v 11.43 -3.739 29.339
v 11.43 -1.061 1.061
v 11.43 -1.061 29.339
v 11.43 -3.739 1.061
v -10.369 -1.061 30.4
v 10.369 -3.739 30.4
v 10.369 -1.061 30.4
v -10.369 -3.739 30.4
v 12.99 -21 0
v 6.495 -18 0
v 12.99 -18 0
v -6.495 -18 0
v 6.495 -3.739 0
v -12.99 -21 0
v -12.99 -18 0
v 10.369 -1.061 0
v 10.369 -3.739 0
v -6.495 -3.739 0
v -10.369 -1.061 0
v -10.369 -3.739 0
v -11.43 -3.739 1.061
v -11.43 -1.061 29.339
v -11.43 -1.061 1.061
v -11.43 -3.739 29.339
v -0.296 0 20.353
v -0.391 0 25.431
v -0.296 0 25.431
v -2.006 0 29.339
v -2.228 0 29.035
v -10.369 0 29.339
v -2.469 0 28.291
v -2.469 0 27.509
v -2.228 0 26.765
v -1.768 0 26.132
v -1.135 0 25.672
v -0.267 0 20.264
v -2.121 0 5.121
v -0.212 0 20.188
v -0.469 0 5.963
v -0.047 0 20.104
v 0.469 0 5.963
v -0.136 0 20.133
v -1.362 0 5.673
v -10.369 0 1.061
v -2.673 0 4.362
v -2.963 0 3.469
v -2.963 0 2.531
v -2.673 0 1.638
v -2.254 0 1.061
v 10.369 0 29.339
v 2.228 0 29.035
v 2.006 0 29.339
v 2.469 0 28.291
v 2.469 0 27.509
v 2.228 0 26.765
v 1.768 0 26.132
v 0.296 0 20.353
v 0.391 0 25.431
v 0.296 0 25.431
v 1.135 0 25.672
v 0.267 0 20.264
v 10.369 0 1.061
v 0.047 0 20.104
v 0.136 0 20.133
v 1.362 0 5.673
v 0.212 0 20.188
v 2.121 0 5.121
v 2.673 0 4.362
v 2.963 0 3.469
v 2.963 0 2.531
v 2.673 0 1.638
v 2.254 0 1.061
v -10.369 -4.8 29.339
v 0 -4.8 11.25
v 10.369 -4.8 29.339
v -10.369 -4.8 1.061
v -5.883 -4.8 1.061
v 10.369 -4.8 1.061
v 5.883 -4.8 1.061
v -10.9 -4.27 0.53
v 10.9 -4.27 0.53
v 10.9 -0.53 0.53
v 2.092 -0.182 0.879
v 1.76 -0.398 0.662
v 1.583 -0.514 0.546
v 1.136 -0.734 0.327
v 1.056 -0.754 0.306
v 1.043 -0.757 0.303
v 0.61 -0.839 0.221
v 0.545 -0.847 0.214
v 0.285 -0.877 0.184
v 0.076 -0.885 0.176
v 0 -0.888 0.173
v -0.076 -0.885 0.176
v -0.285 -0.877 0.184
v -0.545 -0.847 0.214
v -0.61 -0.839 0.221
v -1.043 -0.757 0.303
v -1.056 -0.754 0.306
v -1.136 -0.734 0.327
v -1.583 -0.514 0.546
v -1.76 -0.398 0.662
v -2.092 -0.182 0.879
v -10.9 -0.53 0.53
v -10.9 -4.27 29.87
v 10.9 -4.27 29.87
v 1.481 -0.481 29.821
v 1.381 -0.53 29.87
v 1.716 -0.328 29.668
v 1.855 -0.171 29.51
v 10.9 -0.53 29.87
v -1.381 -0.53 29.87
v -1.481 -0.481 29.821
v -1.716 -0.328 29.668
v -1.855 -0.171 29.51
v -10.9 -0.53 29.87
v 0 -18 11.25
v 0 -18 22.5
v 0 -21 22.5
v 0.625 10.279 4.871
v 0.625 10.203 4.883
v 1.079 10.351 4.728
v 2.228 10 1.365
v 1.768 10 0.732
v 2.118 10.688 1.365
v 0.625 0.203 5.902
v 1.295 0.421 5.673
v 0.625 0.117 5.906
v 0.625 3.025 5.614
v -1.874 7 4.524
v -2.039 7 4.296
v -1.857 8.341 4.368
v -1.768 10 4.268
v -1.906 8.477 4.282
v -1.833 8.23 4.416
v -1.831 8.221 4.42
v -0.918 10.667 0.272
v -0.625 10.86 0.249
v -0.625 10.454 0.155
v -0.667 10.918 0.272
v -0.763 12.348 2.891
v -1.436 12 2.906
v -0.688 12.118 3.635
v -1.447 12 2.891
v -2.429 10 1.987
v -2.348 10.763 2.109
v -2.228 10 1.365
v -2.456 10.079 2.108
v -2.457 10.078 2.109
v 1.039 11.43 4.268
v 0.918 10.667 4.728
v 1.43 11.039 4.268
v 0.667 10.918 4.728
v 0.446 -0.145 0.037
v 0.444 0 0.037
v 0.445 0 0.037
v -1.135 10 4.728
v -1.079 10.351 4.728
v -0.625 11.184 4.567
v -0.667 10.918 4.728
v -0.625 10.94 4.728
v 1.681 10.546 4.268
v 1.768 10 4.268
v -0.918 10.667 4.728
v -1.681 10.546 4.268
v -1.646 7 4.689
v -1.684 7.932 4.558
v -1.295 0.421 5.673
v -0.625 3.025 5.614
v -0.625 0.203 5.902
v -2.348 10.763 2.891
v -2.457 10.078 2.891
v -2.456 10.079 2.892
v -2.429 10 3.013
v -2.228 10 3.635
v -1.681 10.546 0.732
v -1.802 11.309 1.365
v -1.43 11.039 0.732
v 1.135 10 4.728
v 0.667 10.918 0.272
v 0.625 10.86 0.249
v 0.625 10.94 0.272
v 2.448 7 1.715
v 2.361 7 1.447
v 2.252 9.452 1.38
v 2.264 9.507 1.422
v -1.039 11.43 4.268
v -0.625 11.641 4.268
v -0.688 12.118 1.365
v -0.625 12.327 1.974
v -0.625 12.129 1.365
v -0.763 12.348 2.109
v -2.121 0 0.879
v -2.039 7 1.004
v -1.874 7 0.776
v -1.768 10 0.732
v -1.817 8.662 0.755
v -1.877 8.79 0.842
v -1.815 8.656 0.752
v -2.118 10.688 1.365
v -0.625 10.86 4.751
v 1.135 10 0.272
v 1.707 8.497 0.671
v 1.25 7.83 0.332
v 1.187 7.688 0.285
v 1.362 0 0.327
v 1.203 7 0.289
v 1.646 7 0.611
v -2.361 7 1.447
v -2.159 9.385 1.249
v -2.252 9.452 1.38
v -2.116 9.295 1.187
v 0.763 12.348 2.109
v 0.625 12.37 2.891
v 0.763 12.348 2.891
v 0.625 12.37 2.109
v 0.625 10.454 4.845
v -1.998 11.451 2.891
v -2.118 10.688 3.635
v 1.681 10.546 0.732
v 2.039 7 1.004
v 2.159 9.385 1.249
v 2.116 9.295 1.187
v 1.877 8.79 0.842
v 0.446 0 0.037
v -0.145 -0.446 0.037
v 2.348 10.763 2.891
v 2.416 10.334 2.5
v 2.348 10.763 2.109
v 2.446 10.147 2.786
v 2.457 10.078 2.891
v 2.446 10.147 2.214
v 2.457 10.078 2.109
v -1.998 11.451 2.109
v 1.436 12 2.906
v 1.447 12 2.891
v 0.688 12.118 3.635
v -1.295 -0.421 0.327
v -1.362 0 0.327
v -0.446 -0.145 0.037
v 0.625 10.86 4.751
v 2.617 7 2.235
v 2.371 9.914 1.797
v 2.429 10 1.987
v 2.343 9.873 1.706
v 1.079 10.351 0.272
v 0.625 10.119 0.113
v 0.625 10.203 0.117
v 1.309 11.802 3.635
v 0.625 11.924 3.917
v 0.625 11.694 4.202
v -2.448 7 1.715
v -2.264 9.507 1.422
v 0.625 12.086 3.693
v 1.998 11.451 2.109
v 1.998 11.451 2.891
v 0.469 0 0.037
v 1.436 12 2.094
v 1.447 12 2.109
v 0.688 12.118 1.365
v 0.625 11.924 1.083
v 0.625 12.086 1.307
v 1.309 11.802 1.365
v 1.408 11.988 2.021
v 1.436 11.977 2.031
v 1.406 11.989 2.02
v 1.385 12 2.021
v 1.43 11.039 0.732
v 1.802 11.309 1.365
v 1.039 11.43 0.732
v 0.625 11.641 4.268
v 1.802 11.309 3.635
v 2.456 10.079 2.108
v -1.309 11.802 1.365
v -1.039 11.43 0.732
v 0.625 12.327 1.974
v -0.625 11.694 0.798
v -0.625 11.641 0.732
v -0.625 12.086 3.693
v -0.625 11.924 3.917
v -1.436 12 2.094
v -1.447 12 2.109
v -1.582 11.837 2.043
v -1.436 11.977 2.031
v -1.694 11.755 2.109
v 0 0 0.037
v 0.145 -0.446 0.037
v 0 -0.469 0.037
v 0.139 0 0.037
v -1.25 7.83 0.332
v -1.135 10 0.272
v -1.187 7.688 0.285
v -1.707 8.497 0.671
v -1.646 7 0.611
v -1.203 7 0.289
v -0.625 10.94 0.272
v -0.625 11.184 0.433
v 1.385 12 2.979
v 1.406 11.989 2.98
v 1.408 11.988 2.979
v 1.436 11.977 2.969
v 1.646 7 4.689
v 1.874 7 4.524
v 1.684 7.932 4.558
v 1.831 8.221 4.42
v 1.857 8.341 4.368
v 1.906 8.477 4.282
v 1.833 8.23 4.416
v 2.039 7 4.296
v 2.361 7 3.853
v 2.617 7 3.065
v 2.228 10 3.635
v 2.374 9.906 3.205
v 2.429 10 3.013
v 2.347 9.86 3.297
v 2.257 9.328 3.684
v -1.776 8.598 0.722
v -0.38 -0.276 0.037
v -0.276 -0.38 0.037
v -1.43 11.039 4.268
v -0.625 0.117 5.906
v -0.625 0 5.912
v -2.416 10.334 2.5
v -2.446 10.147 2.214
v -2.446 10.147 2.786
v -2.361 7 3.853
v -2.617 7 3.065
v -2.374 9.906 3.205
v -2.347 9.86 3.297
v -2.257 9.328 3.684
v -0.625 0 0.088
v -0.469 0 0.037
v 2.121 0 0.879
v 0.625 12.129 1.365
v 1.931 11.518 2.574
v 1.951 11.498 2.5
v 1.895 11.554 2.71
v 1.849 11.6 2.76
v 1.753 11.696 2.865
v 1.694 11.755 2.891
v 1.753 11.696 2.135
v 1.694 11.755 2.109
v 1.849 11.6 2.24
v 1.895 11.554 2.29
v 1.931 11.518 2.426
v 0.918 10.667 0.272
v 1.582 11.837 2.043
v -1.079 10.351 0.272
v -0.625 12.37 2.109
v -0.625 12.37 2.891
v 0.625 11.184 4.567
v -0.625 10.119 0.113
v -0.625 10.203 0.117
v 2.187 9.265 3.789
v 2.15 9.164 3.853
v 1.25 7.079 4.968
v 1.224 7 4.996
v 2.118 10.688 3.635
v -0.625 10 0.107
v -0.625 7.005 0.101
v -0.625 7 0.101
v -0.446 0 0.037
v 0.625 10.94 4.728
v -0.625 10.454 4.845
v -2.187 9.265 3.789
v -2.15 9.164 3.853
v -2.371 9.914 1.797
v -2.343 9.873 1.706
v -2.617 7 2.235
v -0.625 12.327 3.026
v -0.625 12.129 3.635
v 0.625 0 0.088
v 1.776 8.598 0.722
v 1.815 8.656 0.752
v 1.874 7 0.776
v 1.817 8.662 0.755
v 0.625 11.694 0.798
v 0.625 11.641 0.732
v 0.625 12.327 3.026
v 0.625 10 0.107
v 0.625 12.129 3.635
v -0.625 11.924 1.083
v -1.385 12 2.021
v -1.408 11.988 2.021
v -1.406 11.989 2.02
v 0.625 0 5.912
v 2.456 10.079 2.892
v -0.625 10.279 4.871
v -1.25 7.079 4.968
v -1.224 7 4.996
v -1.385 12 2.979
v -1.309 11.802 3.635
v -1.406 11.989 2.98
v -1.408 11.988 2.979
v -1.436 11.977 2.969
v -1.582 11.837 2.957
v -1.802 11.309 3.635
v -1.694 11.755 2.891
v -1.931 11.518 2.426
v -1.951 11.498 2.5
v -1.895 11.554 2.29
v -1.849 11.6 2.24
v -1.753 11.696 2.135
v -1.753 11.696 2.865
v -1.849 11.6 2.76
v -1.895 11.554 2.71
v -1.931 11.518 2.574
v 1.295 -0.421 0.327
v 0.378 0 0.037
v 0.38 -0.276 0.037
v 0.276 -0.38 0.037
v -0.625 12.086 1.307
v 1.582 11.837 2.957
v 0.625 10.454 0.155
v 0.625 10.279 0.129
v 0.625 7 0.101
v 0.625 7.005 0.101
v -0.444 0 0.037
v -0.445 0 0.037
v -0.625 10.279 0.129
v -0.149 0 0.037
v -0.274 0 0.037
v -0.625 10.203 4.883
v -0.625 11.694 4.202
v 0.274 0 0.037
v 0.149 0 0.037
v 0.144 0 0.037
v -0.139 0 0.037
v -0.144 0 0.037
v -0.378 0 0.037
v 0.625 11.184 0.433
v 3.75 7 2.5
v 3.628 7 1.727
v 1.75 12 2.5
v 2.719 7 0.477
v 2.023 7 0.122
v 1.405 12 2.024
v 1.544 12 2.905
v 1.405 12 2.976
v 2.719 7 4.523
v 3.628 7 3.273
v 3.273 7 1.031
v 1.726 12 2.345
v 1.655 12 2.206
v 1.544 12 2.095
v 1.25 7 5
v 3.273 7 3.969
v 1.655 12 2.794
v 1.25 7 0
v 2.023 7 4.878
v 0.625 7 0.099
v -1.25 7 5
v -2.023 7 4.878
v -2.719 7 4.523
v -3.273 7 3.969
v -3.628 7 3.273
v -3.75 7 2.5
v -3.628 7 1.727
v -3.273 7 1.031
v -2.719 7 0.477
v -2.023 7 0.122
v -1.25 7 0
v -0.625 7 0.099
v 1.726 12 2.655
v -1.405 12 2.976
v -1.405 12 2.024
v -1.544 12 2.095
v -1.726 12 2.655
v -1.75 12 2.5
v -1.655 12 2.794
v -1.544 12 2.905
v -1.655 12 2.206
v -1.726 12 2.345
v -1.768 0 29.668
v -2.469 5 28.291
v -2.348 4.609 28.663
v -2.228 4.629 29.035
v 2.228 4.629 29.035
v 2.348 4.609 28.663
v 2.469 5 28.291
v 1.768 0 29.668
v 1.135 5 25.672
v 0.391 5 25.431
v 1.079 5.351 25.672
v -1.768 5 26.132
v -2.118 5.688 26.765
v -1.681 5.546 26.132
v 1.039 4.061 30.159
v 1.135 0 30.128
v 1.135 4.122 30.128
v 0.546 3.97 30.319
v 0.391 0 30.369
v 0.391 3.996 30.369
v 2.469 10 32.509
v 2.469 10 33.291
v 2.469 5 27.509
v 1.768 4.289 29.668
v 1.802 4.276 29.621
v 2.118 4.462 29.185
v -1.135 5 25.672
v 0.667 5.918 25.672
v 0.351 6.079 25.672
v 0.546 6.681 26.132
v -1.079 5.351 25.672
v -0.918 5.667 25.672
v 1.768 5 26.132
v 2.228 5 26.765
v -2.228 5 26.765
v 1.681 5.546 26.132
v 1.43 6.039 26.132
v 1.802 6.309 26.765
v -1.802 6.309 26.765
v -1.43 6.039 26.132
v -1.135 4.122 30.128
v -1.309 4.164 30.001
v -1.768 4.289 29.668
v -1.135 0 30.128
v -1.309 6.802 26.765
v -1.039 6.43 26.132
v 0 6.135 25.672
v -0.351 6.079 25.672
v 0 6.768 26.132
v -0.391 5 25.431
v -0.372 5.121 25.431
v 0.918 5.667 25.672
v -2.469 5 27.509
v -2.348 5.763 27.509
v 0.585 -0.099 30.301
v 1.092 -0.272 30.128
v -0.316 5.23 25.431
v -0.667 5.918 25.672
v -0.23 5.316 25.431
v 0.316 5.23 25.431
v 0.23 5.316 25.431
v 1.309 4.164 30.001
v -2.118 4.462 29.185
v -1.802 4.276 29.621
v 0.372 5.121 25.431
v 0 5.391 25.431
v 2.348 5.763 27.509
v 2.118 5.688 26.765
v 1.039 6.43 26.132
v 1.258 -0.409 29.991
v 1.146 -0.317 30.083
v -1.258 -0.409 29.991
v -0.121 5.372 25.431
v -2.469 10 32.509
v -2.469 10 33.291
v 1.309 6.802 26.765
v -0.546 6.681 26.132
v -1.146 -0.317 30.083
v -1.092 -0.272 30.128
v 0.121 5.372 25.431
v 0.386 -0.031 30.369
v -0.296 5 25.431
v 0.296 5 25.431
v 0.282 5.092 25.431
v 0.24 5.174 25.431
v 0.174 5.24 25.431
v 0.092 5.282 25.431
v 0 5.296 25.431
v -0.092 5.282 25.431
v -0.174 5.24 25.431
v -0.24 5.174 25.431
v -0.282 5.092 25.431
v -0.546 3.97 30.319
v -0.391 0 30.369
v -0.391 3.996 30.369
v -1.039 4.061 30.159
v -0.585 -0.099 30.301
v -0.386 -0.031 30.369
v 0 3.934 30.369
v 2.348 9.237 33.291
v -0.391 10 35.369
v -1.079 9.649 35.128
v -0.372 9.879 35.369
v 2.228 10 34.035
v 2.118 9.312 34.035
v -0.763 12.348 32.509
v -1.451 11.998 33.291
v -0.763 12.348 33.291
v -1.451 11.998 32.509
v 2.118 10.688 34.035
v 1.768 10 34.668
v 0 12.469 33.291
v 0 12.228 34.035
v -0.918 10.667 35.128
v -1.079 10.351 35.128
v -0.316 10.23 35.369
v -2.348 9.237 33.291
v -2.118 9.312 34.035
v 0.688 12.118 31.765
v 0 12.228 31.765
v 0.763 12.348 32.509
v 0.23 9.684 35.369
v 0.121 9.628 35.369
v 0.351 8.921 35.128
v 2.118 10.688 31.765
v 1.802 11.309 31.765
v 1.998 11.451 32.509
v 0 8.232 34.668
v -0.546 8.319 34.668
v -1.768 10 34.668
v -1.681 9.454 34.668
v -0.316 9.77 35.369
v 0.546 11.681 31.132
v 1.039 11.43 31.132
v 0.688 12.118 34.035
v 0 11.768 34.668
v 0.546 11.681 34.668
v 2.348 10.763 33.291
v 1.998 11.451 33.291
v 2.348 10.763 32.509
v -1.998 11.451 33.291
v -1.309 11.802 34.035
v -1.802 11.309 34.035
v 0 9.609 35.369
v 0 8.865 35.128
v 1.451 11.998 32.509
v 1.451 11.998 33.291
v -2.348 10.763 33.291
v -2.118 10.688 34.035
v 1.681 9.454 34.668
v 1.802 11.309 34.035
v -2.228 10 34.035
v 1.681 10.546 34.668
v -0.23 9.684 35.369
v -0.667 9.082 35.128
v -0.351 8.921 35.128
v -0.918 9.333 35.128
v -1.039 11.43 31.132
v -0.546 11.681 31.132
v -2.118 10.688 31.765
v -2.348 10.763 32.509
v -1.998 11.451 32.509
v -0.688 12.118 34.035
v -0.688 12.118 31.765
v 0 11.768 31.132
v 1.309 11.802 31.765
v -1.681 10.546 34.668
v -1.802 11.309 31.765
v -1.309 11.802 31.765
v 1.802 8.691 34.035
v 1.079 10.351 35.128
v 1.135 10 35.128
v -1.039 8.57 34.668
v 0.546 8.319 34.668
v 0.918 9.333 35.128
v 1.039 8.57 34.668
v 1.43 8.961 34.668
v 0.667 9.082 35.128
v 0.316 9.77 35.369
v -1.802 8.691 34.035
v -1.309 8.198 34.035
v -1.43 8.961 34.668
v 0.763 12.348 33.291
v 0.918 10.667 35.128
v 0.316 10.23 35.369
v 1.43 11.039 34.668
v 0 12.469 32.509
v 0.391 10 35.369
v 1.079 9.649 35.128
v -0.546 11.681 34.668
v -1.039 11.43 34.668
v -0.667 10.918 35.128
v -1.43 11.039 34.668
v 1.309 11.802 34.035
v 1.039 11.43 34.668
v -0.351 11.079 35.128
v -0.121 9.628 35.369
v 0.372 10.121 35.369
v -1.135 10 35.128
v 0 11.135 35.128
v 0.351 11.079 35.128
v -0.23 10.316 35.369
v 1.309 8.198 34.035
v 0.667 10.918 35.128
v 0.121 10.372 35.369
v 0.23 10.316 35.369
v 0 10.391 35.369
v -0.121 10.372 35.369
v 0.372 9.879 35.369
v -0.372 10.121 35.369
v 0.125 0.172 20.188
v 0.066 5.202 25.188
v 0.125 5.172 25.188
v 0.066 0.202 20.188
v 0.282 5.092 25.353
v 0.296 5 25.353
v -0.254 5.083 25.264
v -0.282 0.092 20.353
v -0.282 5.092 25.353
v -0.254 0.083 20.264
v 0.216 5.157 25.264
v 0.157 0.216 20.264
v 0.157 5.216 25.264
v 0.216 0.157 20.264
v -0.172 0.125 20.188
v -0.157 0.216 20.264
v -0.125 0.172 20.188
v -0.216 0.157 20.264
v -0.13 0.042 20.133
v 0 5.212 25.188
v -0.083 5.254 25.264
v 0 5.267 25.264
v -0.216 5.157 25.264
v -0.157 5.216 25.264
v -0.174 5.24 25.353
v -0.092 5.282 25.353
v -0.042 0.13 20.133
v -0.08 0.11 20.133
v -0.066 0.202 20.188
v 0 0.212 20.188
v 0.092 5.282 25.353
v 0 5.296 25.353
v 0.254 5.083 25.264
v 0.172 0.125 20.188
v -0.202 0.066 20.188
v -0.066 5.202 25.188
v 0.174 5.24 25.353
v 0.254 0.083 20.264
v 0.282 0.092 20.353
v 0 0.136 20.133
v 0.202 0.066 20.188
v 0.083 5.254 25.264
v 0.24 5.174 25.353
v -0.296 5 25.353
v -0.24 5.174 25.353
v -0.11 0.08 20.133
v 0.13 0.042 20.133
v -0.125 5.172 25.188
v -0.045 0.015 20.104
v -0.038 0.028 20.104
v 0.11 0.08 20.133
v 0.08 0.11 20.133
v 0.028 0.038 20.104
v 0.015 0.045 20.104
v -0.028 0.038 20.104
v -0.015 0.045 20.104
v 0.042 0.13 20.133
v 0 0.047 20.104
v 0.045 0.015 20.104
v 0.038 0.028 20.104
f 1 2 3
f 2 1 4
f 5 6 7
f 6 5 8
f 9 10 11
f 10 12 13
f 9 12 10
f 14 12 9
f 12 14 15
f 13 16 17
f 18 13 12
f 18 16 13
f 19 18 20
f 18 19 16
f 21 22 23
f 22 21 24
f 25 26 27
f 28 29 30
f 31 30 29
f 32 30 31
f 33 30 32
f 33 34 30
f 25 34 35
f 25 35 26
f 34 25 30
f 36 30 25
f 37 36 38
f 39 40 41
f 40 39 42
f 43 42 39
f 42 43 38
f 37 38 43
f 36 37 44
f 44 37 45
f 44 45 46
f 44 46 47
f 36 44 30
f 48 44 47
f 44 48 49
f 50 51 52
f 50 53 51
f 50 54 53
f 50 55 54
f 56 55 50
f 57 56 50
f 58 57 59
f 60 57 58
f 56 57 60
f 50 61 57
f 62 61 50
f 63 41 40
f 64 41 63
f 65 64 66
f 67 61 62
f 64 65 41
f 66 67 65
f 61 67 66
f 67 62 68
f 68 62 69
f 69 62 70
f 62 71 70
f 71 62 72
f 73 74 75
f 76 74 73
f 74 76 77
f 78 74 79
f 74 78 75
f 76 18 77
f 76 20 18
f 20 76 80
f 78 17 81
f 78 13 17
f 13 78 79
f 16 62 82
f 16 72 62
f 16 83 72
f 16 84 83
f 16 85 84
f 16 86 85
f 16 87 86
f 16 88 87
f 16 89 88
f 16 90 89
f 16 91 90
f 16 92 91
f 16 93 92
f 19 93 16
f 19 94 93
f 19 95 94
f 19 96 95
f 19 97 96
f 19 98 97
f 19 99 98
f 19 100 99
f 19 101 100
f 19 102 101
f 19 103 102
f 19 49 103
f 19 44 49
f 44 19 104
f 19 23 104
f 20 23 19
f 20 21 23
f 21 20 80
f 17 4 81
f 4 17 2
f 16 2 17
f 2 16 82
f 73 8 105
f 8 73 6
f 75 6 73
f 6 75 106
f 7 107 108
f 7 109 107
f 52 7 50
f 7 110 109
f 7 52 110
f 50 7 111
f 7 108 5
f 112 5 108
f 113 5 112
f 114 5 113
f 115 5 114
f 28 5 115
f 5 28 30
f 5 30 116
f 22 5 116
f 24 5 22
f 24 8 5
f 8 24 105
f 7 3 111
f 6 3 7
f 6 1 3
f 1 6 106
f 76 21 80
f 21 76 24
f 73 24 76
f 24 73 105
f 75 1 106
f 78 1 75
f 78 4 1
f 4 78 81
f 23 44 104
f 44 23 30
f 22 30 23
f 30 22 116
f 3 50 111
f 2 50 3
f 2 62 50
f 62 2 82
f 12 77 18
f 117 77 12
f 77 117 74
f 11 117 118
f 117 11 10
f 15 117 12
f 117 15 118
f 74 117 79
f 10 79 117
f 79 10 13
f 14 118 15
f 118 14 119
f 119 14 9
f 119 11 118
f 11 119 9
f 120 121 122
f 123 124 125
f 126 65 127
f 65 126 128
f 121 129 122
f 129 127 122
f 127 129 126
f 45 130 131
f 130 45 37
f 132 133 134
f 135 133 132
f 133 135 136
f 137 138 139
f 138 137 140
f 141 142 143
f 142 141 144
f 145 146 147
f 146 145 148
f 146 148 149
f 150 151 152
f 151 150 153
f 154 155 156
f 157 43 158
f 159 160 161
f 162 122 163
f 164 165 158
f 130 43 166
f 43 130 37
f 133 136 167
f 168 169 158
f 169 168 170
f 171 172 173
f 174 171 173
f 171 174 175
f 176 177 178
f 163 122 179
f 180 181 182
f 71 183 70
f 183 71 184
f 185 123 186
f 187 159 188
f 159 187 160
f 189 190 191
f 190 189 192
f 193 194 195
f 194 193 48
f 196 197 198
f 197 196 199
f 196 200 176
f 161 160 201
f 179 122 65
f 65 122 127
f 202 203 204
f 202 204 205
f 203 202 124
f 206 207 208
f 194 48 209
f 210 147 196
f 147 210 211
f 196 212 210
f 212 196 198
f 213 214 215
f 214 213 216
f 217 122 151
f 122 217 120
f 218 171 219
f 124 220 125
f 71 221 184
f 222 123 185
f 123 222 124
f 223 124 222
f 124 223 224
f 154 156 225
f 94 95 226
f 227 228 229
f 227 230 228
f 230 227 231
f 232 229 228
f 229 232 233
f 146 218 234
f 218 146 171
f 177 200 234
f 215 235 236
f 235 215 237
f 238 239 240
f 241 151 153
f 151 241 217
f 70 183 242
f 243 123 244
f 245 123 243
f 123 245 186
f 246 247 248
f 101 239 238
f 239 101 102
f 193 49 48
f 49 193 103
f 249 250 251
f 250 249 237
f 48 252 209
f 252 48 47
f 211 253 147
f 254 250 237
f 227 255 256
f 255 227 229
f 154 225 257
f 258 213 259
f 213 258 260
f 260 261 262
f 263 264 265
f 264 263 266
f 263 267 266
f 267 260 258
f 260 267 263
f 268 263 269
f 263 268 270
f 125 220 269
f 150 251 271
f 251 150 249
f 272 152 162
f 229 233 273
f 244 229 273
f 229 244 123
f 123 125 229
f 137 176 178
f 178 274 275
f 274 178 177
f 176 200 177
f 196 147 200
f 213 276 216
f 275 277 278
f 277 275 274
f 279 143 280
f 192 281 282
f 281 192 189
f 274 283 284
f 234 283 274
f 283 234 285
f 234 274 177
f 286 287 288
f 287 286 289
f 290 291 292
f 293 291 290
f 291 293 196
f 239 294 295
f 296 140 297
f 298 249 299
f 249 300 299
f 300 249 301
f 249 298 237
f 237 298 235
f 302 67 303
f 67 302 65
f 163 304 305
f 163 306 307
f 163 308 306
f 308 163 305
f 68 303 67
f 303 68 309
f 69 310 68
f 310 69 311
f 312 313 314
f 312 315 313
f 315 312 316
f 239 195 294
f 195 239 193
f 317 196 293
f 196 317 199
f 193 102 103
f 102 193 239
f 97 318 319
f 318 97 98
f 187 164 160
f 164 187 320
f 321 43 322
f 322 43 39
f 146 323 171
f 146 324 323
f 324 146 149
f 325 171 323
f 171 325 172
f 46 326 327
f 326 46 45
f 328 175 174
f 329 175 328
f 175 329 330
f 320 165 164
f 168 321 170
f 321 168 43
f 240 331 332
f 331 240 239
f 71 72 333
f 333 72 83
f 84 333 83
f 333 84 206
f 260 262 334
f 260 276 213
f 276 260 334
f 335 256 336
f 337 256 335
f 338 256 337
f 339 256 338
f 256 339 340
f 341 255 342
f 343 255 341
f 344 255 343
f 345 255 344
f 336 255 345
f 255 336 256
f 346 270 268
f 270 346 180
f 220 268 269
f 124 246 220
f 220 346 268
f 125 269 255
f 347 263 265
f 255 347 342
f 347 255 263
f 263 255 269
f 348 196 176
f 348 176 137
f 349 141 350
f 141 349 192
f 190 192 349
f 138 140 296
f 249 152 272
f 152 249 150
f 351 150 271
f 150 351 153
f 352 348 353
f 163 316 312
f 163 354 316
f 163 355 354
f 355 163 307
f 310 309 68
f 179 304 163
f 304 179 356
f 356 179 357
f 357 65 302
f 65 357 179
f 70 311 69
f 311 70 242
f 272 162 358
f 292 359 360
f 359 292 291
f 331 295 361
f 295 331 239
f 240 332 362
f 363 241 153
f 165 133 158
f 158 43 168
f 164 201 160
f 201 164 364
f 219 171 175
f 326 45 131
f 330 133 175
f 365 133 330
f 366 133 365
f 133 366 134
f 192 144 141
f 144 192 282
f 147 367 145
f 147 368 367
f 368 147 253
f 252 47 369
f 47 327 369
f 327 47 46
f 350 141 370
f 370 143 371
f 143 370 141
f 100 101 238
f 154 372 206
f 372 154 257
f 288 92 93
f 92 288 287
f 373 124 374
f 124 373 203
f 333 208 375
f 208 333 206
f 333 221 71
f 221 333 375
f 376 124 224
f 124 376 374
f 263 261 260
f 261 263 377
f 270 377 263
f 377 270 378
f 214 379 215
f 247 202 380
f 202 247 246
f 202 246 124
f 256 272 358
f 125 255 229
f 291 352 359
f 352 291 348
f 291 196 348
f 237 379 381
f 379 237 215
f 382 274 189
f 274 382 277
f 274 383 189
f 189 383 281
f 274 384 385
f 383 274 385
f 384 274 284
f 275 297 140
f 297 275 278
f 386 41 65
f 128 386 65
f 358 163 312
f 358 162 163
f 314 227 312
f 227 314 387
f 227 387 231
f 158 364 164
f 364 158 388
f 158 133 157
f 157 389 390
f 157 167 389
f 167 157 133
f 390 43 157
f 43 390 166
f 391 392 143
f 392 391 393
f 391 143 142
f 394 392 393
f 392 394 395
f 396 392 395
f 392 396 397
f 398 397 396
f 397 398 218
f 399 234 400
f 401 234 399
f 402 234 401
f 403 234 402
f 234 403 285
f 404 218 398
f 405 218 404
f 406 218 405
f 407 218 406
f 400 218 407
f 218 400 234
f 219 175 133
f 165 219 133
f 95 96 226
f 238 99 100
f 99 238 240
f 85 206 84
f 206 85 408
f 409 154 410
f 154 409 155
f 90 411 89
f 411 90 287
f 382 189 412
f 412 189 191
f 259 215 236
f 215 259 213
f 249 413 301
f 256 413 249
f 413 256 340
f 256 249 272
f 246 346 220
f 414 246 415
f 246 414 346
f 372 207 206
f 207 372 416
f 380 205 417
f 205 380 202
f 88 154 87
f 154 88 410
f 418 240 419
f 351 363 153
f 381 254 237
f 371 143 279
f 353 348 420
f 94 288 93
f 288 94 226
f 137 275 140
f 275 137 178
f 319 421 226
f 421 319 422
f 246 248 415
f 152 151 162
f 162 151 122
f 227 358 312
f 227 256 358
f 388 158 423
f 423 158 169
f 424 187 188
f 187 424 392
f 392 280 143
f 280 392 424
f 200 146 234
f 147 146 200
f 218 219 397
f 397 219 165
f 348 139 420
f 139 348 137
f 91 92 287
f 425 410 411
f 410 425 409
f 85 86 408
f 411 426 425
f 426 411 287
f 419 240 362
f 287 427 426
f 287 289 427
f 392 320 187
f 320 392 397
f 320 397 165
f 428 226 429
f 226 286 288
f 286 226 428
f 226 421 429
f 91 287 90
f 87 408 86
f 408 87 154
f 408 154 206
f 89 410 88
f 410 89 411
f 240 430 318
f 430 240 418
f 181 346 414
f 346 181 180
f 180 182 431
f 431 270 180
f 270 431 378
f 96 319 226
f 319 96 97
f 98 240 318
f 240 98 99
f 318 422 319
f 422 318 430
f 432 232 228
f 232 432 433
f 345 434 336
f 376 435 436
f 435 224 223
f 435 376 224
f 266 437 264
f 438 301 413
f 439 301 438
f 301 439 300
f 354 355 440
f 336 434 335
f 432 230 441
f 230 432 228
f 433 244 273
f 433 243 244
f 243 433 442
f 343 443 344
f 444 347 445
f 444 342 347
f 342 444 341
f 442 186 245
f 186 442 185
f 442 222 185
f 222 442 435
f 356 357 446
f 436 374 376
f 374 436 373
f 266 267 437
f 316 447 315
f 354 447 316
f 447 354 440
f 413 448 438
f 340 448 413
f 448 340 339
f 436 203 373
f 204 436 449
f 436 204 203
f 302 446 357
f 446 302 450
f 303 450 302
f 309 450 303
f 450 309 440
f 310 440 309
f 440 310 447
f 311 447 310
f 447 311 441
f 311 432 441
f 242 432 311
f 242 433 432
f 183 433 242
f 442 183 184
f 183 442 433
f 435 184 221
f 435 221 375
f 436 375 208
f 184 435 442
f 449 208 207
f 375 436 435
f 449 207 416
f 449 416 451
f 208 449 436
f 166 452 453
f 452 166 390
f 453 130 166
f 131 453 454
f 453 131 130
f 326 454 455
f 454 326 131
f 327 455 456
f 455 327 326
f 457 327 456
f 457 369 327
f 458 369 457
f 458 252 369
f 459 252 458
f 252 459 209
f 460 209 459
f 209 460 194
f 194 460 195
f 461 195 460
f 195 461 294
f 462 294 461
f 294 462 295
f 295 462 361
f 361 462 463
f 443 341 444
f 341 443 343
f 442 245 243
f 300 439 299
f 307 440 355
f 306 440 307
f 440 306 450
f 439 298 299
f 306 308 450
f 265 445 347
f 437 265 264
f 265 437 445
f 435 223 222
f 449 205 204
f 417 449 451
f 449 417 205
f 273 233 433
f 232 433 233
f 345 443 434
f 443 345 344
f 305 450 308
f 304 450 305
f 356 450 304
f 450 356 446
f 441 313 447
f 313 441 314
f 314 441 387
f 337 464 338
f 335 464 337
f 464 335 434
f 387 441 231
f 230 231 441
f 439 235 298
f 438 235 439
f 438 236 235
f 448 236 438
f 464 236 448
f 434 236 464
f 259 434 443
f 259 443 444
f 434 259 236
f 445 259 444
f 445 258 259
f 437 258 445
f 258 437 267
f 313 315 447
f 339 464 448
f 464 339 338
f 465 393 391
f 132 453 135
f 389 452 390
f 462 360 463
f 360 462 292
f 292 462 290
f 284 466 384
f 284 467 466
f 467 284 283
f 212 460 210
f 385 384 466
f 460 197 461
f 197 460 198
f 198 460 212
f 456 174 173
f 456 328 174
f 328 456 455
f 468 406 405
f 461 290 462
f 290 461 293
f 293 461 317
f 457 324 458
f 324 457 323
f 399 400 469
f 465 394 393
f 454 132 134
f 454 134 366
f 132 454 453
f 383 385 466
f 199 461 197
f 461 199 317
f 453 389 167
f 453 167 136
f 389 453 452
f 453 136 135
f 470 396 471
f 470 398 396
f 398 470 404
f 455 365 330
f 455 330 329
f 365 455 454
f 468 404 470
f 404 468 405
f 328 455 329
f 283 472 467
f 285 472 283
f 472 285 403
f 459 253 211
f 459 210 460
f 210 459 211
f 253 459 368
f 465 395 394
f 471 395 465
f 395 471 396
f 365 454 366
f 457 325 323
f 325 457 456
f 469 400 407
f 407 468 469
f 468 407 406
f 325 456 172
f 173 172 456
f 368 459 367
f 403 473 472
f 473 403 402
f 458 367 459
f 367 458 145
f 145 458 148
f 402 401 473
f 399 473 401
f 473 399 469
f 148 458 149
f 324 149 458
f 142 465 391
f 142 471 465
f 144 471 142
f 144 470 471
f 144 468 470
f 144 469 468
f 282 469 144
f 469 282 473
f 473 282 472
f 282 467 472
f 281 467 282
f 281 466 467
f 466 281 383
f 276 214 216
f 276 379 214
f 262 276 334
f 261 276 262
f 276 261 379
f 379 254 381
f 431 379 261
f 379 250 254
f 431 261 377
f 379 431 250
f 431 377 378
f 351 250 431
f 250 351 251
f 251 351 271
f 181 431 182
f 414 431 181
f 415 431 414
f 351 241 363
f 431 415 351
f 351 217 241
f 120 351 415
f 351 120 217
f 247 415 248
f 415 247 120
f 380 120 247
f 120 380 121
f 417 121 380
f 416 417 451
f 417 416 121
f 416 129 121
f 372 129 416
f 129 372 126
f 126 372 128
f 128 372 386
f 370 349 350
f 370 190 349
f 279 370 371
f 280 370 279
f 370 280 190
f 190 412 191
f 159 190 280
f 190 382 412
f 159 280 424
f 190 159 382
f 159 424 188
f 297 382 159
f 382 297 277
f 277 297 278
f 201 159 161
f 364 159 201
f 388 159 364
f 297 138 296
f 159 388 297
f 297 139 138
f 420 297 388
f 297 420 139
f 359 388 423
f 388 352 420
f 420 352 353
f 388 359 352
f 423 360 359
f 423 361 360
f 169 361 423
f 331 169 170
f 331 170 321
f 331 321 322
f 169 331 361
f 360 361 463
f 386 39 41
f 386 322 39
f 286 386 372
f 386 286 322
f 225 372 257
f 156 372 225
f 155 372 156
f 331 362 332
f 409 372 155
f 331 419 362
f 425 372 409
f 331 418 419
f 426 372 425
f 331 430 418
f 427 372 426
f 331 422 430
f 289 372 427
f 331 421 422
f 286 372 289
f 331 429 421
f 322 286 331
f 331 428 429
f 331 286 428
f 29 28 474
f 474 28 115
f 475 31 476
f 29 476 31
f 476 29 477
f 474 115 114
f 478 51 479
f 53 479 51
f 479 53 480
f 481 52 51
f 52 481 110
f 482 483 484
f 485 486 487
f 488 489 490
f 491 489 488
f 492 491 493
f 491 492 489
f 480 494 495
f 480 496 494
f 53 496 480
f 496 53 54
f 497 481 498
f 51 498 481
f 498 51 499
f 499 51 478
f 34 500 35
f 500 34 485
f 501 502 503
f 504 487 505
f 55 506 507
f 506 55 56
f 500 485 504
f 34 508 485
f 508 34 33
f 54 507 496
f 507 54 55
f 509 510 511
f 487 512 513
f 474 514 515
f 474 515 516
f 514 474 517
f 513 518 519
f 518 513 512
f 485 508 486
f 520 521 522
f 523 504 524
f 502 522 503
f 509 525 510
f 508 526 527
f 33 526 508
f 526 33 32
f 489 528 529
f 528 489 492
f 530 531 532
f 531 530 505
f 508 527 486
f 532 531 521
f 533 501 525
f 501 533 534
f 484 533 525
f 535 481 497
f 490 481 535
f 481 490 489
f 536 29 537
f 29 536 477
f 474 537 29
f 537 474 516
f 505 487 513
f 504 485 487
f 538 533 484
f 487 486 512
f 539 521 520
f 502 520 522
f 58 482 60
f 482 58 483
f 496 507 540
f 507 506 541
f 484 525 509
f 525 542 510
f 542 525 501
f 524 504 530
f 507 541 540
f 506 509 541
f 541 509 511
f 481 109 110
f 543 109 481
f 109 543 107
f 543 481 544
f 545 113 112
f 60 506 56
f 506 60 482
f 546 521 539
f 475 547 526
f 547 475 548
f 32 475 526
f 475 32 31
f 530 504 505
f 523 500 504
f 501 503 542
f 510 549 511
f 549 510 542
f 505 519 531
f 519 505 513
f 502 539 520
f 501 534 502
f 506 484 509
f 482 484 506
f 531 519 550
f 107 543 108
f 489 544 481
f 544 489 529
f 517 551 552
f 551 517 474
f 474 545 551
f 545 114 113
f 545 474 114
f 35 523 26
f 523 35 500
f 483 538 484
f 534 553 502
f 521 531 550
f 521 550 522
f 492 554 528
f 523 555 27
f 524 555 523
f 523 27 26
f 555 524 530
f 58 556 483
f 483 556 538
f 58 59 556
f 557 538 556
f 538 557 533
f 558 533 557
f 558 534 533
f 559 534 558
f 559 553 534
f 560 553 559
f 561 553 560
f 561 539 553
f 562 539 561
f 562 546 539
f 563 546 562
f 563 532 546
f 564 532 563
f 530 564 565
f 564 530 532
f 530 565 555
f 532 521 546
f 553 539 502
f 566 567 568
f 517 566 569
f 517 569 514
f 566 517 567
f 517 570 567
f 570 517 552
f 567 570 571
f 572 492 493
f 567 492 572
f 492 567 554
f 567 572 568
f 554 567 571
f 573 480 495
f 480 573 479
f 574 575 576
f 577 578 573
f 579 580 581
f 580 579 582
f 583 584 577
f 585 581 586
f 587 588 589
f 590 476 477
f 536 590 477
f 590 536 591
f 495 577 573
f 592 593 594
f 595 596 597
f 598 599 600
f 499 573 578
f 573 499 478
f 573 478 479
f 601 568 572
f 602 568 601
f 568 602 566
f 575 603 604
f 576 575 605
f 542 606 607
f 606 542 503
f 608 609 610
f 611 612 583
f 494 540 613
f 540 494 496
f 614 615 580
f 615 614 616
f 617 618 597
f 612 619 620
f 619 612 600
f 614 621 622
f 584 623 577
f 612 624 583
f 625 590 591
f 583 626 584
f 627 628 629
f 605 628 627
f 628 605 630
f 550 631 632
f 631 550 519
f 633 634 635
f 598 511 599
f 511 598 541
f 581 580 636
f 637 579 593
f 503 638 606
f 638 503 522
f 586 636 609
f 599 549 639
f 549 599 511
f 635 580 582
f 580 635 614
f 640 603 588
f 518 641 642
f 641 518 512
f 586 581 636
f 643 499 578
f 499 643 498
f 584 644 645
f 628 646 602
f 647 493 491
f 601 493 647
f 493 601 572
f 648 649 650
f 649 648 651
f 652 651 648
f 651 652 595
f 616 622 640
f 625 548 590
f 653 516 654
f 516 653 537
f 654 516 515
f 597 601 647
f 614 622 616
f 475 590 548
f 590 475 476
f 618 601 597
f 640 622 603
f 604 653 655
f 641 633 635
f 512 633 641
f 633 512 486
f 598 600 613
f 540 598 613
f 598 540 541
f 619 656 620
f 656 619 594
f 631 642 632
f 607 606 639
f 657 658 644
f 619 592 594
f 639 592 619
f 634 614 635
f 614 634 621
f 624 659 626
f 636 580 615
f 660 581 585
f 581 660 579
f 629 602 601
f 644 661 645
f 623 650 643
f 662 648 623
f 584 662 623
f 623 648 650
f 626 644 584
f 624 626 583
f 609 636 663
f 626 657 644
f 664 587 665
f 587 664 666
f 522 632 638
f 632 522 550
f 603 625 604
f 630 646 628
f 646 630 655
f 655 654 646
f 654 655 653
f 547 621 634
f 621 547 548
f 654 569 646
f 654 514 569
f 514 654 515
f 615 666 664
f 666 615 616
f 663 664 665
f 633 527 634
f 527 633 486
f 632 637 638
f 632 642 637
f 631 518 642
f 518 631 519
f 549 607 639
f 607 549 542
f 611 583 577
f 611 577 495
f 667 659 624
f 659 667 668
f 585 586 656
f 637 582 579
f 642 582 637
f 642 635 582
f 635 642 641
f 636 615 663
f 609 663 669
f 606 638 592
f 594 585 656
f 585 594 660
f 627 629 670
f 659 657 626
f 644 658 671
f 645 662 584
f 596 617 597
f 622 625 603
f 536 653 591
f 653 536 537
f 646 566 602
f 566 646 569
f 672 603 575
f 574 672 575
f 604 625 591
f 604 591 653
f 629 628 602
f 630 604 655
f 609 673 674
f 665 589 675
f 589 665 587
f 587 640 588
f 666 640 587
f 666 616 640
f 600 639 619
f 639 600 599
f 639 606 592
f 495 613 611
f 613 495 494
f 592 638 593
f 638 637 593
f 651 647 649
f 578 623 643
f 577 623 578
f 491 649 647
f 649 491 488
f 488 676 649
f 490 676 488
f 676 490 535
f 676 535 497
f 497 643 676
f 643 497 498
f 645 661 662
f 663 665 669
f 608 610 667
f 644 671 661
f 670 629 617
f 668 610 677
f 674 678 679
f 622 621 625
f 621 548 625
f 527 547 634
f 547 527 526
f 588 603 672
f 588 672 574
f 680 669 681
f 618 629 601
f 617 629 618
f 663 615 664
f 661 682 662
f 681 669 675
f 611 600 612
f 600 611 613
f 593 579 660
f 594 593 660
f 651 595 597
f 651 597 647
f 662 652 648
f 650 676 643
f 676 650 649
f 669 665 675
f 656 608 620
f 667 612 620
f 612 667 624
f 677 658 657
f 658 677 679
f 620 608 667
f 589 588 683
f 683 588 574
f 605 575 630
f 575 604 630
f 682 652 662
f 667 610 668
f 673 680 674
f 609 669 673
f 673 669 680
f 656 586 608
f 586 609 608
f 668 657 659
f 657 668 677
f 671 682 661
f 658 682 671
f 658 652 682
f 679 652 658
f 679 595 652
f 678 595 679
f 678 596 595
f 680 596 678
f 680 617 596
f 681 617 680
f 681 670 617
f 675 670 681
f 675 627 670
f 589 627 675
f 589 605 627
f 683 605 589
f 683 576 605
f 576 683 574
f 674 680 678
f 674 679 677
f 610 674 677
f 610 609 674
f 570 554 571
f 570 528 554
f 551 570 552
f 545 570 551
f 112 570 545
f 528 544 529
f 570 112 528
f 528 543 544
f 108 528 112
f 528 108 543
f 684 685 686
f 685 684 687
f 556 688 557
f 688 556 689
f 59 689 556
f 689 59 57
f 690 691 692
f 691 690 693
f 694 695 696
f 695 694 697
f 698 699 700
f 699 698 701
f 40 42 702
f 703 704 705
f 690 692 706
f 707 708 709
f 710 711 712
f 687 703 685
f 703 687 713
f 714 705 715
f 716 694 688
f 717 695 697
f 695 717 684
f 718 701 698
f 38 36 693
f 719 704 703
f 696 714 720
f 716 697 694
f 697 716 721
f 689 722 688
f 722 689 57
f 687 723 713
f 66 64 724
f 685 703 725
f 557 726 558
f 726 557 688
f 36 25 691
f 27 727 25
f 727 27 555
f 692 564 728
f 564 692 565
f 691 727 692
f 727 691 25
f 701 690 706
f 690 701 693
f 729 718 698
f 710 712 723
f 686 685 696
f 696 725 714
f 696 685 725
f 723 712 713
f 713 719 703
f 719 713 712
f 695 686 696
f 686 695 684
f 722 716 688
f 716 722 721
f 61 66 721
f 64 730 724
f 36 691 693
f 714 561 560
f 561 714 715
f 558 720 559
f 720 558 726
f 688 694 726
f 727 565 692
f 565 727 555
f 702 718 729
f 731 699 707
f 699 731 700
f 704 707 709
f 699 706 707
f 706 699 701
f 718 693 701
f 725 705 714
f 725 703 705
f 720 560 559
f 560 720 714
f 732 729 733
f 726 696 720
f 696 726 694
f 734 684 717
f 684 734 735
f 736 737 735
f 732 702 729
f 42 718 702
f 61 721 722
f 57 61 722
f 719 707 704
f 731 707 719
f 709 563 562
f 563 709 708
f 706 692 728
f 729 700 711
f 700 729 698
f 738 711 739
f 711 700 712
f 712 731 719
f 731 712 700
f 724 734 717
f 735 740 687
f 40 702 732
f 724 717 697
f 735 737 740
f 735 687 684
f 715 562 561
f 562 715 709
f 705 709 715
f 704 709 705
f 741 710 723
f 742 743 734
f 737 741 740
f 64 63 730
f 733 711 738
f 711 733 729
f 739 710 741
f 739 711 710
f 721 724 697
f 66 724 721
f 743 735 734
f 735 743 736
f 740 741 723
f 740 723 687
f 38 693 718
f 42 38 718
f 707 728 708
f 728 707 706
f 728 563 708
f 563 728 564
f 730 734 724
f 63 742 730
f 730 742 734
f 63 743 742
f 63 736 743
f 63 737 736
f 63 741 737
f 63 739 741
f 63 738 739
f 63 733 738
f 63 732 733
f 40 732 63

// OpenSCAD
// file: ../primitives/chamfers.scad
module chamfered_cube(x,y,z,edge){
    difference(){
        cube([x,y,z]);
        
        
        // Buttom Cuts
        translate([0,0,(-sqrt(2)*(edge))/2])
            rotate([45,0,0])
                cube([x,edge,edge]);
        
        translate([0,y,(-sqrt(2)*(edge))/2])
            rotate([45,0,0])
                cube([x,edge,edge]);
        
        translate([0,0,(-sqrt(2)*(edge))/2])
            rotate([0,-45,0])
                cube([edge,y,edge]);
        
        translate([x,0,(-sqrt(2)*(edge))/2])
            rotate([0,-45,0])
                cube([edge,y,edge]);
        
        // Top Cuts
        translate([0,0,z-(sqrt(2)*(edge))/2])
            rotate([45,0,0])
                cube([x,edge,edge]);
        
        translate([0,y,z-(sqrt(2)*(edge))/2])
            rotate([45,0,0])
                cube([x,edge,edge]);
        
        translate([0,0,z-(sqrt(2)*(edge))/2])
            rotate([0,-45,0])
                cube([edge,y,edge]);
        
        translate([x,0,z-(sqrt(2)*(edge))/2])
            rotate([0,-45,0])
                cube([edge,y,edge]);
                
        // Side Cuts
        translate([0,-(sqrt(2)*(edge))/2,0])
            rotate([0,0,45])
                cube([edge,edge,z]);
                
        translate([x,-(sqrt(2)*(edge))/2,0])
            rotate([0,0,45])
                cube([edge,edge,z]);
                

        translate([0,y-(sqrt(2)*(edge))/2,0])
            rotate([0,0,45])
                cube([edge,edge,z]);
                
        translate([x,y-(sqrt(2)*(edge))/2,0])
            rotate([0,0,45])
                cube([edge,edge,z]);

        
    }
  
}


module chamfered_box(x,y,z,edge,wall_thickness){
    difference(){
        chamfered_cube(x,y,z,edge);
        
        translate([wall_thickness, wall_thickness,wall_thickness])
            chamfered_cube(x-wall_thickness*2,
                       y-wall_thickness*2,
                       z-wall_thickness*2,
                       edge/sqrt(2));
            
    }
}

module chamfered_square_ring(x,y,thickness,edge){
    chamfered_cube(x,thickness,thickness,edge);
    chamfered_cube(thickness,y,thickness,edge);
    translate([0,y-thickness,0])
        chamfered_cube(x,thickness,thickness,edge);
    translate([x-thickness,0,0])
        chamfered_cube(thickness,y,thickness,edge);

}

module chamfered_main(){
    chamfered_square_ring(10,20,3,1);
    
}

//chamfered_main();
// file: pegboard.scad
hole_pitch = 25.4;
hole_diameter = 5;
board_thickness = 5;
wall_thickness = 0.6*3;

$fn=20;

include <../primitives/chamfers.scad>;

module peg_lower_support(){
    // Thickness of the slot
    slot = hole_diameter/4;
    // 
    snap_offset = board_thickness+2;
    // Shift everything Down 1 peg hole

        difference(){
            union(){
                hull(){
                    translate([0,0,0.5])
                        sphere(d=hole_diameter+1);
                    translate([0,board_thickness*2,0])
                        sphere(d=hole_diameter);
                
                }
                translate([slot,snap_offset,0])
                    rotate([-90,0,0])
                        cylinder( h=hole_diameter,
                            d1=hole_diameter,d2=1);
                translate([-slot,snap_offset,0])
                    rotate([-90,0,0])
                        cylinder( h=hole_diameter,
                            d1=hole_diameter,d2=1);
            }
            translate([-slot/2,0,-hole_diameter]){
                cube([slot,board_thickness*3,hole_diameter*2]);
            }
        }
    
    
}

module peg_hook(){
    difference(){
        union(){
            hull(){
                sphere(d=hole_diameter);
                translate([0,board_thickness,0])
                    sphere(d=hole_diameter);
            }
            hull(){
                translate([0,board_thickness,0])
                    sphere(d=hole_diameter);
                translate([0,2*board_thickness,board_thickness])
                    sphere(d=hole_diameter);
            }
        }
        // Cutting off the edge of the hook
        translate([0,-hole_diameter/2,(hole_pitch/2)*sqrt(2)]){
            rotate([45,0,0])
                cube(hole_pitch,center=true);
        }
    }
    // Add Fin support that is to be snipped off
    hull(){
        d1 = 1;
        d2 = 0.6;
        translate([0,0,-hole_diameter/2])
            sphere(d=d2);
        translate([0,board_thickness,-hole_diameter/2])
            sphere(d=d2);
        translate([0,0,-hole_diameter/2-board_thickness])
            sphere(d=d2);
    }
    
}

module peg_plate_sharp(){
    difference(){
        linear_extrude(hole_pitch+hole_diameter,scale=[0.8,1.0])
                polygon([
                    [0,0],
                    [hole_diameter*1.5,0],
                    [hole_diameter*0.5,hole_diameter],
                    [-1*hole_diameter*0.5,hole_diameter],
                    [-1*hole_diameter*1.5,0],

                ]);
    translate([0,0,(hole_pitch+hole_diameter)*sqrt(2)])
        rotate([45,0,0])
            cube(hole_pitch,center=true);
    }
}

module peg_plate(support=false){
    r_mink = 0.25;
    // Shift the peg plat up to offset the minkowski
    translate([0,0,r_mink])
        minkowski(){
            peg_plate_sharp();
            sphere(r_mink,$fn=8);
        }
    if(support){
        translate([0,-3,0])
            cylinder(0.2,r=7);
    }
}

module peg_hook_template(support=false){
    translate([0,hole_diameter,hole_diameter/2])
        peg_lower_support();
    translate([0,hole_diameter,hole_pitch+hole_diameter/2])
        peg_hook();
    
    
    peg_plate(support);
    
}

module external_hook(){
    
    translate([hole_diameter*2,-hole_diameter-wall_thickness,0])
        rotate([90,0,0])
            linear_extrude(board_thickness)
                circle(d=hole_diameter);
    translate([0,-board_thickness-hole_diameter-wall_thickness,0])
    rotate([0,0,-75])
        rotate_extrude(angle=75)
            translate([hole_diameter*2, 0, 0])
                circle(d=hole_diameter);
}

module external_plate(support=false){
    y = hole_diameter+wall_thickness;
    // Subtract 1 mm for side by side tolerance purposes
    x = hole_pitch-1;
    z = hole_pitch+hole_diameter+wall_thickness;
    
    difference(){
        union(){
            translate([-x/2,0,0]){
                chamfered_cube(x, y, z,1);
            }
            if(support){
                brim_z=0.2;
                brim_r=6;
                for(a=[x/2,-x/2]){
                    translate([a,0,0])
                        cylinder(h=brim_z,r=brim_r);
                }
            }
        }
         
        translate([0,wall_thickness,-wall_thickness])
            minkowski(){
                peg_plate();
                sphere(0.25, $fn=5);
            }
     }
        
    
    
    // Push-off ribs.  These will push against the wall as it is inserted to toeh hook adapter, creating a snug fit
    rib_width = 3;
    for(a = [x/3, -x/3]){
        hull(){
            translate([a,
                    y-rib_width/4,
                    hole_pitch+rib_width])
                sphere(d=rib_width/2);
            translate([a,
                    y-rib_width/2,
                    rib_width])
                sphere(d=rib_width);
            translate([a,
                    y,
                    hole_pitch])
                sphere(d=rib_width);
        }
    }
    
    
    
}

module caliper_hook_sharp(){
    x_separation = 38;
    y_offset = 12.5;
    hook_length = 10;
    
    cube([hole_diameter,hole_diameter, hook_length]);
    translate([0,0,hook_length])
        cube([hole_diameter,hole_diameter*1.5, hole_diameter]);

    
    translate([x_separation, y_offset,0]){
        cube([hole_diameter,hole_diameter, hook_length]);
        translate([0,0,hook_length])
            cube([hole_diameter,hole_diameter*1.5, hole_diameter]);
        
    }
    
    cube([x_separation+hole_diameter,y_offset+hole_diameter,wall_thickness]);

}

module caliper_hook(){
    minkowski(){
        caliper_hook_sharp();
        sphere(0.25,$fn=5);
    }
}

module double_external_plate(){
    external_plate();
    translate([hole_pitch,0,0])
        external_plate();
}

/* Peg Board Adapter Part */
//peg_hook_template();


/* Accessories */
//double_external_plate();


/* External Hook to a*/
//external_hook();


/* Caliper Hook */
/*
translate([hole_pitch/2+6,-hole_diameter-wall_thickness,-22])
    rotate([90,-90,0])
        caliper_hook();
*/

//external_plate(true);

//peg_plate(true);

//peg_hook_template(true);
//peg_plate_sharp();
// main file
include <pegboard.scad>;
include <../primitives/chamfers.scad>;


$fn = 20;

length_mm = 20;

nozzle_width = 0.6;
wall_layers = 8;



module plate(){
    plate_thickness = wall_layers*nozzle_width;
    plate_width = hole_pitch*0.9;
    plate_height = hole_pitch+hole_diameter;
    
    translate([-plate_width/2,-plate_thickness,0])
    chamfered_cube(plate_width,plate_thickness,plate_height,1.5);
}    

module hook(){
    $fn=3;
    translate([0,-3,3.75])
    rotate([90,270,0]){
        cylinder(h=15,d=15);
        translate([3.75,0,15])
        cylinder(h=3,d=30);

    }
}


module main(){        
    plate();
    hook();
    
    translate([0,0,hole_diameter/2]){
        peg_lower_support();
        translate([0,0,hole_pitch])
            peg_hook();
    }
}

difference(){
    main();

}
